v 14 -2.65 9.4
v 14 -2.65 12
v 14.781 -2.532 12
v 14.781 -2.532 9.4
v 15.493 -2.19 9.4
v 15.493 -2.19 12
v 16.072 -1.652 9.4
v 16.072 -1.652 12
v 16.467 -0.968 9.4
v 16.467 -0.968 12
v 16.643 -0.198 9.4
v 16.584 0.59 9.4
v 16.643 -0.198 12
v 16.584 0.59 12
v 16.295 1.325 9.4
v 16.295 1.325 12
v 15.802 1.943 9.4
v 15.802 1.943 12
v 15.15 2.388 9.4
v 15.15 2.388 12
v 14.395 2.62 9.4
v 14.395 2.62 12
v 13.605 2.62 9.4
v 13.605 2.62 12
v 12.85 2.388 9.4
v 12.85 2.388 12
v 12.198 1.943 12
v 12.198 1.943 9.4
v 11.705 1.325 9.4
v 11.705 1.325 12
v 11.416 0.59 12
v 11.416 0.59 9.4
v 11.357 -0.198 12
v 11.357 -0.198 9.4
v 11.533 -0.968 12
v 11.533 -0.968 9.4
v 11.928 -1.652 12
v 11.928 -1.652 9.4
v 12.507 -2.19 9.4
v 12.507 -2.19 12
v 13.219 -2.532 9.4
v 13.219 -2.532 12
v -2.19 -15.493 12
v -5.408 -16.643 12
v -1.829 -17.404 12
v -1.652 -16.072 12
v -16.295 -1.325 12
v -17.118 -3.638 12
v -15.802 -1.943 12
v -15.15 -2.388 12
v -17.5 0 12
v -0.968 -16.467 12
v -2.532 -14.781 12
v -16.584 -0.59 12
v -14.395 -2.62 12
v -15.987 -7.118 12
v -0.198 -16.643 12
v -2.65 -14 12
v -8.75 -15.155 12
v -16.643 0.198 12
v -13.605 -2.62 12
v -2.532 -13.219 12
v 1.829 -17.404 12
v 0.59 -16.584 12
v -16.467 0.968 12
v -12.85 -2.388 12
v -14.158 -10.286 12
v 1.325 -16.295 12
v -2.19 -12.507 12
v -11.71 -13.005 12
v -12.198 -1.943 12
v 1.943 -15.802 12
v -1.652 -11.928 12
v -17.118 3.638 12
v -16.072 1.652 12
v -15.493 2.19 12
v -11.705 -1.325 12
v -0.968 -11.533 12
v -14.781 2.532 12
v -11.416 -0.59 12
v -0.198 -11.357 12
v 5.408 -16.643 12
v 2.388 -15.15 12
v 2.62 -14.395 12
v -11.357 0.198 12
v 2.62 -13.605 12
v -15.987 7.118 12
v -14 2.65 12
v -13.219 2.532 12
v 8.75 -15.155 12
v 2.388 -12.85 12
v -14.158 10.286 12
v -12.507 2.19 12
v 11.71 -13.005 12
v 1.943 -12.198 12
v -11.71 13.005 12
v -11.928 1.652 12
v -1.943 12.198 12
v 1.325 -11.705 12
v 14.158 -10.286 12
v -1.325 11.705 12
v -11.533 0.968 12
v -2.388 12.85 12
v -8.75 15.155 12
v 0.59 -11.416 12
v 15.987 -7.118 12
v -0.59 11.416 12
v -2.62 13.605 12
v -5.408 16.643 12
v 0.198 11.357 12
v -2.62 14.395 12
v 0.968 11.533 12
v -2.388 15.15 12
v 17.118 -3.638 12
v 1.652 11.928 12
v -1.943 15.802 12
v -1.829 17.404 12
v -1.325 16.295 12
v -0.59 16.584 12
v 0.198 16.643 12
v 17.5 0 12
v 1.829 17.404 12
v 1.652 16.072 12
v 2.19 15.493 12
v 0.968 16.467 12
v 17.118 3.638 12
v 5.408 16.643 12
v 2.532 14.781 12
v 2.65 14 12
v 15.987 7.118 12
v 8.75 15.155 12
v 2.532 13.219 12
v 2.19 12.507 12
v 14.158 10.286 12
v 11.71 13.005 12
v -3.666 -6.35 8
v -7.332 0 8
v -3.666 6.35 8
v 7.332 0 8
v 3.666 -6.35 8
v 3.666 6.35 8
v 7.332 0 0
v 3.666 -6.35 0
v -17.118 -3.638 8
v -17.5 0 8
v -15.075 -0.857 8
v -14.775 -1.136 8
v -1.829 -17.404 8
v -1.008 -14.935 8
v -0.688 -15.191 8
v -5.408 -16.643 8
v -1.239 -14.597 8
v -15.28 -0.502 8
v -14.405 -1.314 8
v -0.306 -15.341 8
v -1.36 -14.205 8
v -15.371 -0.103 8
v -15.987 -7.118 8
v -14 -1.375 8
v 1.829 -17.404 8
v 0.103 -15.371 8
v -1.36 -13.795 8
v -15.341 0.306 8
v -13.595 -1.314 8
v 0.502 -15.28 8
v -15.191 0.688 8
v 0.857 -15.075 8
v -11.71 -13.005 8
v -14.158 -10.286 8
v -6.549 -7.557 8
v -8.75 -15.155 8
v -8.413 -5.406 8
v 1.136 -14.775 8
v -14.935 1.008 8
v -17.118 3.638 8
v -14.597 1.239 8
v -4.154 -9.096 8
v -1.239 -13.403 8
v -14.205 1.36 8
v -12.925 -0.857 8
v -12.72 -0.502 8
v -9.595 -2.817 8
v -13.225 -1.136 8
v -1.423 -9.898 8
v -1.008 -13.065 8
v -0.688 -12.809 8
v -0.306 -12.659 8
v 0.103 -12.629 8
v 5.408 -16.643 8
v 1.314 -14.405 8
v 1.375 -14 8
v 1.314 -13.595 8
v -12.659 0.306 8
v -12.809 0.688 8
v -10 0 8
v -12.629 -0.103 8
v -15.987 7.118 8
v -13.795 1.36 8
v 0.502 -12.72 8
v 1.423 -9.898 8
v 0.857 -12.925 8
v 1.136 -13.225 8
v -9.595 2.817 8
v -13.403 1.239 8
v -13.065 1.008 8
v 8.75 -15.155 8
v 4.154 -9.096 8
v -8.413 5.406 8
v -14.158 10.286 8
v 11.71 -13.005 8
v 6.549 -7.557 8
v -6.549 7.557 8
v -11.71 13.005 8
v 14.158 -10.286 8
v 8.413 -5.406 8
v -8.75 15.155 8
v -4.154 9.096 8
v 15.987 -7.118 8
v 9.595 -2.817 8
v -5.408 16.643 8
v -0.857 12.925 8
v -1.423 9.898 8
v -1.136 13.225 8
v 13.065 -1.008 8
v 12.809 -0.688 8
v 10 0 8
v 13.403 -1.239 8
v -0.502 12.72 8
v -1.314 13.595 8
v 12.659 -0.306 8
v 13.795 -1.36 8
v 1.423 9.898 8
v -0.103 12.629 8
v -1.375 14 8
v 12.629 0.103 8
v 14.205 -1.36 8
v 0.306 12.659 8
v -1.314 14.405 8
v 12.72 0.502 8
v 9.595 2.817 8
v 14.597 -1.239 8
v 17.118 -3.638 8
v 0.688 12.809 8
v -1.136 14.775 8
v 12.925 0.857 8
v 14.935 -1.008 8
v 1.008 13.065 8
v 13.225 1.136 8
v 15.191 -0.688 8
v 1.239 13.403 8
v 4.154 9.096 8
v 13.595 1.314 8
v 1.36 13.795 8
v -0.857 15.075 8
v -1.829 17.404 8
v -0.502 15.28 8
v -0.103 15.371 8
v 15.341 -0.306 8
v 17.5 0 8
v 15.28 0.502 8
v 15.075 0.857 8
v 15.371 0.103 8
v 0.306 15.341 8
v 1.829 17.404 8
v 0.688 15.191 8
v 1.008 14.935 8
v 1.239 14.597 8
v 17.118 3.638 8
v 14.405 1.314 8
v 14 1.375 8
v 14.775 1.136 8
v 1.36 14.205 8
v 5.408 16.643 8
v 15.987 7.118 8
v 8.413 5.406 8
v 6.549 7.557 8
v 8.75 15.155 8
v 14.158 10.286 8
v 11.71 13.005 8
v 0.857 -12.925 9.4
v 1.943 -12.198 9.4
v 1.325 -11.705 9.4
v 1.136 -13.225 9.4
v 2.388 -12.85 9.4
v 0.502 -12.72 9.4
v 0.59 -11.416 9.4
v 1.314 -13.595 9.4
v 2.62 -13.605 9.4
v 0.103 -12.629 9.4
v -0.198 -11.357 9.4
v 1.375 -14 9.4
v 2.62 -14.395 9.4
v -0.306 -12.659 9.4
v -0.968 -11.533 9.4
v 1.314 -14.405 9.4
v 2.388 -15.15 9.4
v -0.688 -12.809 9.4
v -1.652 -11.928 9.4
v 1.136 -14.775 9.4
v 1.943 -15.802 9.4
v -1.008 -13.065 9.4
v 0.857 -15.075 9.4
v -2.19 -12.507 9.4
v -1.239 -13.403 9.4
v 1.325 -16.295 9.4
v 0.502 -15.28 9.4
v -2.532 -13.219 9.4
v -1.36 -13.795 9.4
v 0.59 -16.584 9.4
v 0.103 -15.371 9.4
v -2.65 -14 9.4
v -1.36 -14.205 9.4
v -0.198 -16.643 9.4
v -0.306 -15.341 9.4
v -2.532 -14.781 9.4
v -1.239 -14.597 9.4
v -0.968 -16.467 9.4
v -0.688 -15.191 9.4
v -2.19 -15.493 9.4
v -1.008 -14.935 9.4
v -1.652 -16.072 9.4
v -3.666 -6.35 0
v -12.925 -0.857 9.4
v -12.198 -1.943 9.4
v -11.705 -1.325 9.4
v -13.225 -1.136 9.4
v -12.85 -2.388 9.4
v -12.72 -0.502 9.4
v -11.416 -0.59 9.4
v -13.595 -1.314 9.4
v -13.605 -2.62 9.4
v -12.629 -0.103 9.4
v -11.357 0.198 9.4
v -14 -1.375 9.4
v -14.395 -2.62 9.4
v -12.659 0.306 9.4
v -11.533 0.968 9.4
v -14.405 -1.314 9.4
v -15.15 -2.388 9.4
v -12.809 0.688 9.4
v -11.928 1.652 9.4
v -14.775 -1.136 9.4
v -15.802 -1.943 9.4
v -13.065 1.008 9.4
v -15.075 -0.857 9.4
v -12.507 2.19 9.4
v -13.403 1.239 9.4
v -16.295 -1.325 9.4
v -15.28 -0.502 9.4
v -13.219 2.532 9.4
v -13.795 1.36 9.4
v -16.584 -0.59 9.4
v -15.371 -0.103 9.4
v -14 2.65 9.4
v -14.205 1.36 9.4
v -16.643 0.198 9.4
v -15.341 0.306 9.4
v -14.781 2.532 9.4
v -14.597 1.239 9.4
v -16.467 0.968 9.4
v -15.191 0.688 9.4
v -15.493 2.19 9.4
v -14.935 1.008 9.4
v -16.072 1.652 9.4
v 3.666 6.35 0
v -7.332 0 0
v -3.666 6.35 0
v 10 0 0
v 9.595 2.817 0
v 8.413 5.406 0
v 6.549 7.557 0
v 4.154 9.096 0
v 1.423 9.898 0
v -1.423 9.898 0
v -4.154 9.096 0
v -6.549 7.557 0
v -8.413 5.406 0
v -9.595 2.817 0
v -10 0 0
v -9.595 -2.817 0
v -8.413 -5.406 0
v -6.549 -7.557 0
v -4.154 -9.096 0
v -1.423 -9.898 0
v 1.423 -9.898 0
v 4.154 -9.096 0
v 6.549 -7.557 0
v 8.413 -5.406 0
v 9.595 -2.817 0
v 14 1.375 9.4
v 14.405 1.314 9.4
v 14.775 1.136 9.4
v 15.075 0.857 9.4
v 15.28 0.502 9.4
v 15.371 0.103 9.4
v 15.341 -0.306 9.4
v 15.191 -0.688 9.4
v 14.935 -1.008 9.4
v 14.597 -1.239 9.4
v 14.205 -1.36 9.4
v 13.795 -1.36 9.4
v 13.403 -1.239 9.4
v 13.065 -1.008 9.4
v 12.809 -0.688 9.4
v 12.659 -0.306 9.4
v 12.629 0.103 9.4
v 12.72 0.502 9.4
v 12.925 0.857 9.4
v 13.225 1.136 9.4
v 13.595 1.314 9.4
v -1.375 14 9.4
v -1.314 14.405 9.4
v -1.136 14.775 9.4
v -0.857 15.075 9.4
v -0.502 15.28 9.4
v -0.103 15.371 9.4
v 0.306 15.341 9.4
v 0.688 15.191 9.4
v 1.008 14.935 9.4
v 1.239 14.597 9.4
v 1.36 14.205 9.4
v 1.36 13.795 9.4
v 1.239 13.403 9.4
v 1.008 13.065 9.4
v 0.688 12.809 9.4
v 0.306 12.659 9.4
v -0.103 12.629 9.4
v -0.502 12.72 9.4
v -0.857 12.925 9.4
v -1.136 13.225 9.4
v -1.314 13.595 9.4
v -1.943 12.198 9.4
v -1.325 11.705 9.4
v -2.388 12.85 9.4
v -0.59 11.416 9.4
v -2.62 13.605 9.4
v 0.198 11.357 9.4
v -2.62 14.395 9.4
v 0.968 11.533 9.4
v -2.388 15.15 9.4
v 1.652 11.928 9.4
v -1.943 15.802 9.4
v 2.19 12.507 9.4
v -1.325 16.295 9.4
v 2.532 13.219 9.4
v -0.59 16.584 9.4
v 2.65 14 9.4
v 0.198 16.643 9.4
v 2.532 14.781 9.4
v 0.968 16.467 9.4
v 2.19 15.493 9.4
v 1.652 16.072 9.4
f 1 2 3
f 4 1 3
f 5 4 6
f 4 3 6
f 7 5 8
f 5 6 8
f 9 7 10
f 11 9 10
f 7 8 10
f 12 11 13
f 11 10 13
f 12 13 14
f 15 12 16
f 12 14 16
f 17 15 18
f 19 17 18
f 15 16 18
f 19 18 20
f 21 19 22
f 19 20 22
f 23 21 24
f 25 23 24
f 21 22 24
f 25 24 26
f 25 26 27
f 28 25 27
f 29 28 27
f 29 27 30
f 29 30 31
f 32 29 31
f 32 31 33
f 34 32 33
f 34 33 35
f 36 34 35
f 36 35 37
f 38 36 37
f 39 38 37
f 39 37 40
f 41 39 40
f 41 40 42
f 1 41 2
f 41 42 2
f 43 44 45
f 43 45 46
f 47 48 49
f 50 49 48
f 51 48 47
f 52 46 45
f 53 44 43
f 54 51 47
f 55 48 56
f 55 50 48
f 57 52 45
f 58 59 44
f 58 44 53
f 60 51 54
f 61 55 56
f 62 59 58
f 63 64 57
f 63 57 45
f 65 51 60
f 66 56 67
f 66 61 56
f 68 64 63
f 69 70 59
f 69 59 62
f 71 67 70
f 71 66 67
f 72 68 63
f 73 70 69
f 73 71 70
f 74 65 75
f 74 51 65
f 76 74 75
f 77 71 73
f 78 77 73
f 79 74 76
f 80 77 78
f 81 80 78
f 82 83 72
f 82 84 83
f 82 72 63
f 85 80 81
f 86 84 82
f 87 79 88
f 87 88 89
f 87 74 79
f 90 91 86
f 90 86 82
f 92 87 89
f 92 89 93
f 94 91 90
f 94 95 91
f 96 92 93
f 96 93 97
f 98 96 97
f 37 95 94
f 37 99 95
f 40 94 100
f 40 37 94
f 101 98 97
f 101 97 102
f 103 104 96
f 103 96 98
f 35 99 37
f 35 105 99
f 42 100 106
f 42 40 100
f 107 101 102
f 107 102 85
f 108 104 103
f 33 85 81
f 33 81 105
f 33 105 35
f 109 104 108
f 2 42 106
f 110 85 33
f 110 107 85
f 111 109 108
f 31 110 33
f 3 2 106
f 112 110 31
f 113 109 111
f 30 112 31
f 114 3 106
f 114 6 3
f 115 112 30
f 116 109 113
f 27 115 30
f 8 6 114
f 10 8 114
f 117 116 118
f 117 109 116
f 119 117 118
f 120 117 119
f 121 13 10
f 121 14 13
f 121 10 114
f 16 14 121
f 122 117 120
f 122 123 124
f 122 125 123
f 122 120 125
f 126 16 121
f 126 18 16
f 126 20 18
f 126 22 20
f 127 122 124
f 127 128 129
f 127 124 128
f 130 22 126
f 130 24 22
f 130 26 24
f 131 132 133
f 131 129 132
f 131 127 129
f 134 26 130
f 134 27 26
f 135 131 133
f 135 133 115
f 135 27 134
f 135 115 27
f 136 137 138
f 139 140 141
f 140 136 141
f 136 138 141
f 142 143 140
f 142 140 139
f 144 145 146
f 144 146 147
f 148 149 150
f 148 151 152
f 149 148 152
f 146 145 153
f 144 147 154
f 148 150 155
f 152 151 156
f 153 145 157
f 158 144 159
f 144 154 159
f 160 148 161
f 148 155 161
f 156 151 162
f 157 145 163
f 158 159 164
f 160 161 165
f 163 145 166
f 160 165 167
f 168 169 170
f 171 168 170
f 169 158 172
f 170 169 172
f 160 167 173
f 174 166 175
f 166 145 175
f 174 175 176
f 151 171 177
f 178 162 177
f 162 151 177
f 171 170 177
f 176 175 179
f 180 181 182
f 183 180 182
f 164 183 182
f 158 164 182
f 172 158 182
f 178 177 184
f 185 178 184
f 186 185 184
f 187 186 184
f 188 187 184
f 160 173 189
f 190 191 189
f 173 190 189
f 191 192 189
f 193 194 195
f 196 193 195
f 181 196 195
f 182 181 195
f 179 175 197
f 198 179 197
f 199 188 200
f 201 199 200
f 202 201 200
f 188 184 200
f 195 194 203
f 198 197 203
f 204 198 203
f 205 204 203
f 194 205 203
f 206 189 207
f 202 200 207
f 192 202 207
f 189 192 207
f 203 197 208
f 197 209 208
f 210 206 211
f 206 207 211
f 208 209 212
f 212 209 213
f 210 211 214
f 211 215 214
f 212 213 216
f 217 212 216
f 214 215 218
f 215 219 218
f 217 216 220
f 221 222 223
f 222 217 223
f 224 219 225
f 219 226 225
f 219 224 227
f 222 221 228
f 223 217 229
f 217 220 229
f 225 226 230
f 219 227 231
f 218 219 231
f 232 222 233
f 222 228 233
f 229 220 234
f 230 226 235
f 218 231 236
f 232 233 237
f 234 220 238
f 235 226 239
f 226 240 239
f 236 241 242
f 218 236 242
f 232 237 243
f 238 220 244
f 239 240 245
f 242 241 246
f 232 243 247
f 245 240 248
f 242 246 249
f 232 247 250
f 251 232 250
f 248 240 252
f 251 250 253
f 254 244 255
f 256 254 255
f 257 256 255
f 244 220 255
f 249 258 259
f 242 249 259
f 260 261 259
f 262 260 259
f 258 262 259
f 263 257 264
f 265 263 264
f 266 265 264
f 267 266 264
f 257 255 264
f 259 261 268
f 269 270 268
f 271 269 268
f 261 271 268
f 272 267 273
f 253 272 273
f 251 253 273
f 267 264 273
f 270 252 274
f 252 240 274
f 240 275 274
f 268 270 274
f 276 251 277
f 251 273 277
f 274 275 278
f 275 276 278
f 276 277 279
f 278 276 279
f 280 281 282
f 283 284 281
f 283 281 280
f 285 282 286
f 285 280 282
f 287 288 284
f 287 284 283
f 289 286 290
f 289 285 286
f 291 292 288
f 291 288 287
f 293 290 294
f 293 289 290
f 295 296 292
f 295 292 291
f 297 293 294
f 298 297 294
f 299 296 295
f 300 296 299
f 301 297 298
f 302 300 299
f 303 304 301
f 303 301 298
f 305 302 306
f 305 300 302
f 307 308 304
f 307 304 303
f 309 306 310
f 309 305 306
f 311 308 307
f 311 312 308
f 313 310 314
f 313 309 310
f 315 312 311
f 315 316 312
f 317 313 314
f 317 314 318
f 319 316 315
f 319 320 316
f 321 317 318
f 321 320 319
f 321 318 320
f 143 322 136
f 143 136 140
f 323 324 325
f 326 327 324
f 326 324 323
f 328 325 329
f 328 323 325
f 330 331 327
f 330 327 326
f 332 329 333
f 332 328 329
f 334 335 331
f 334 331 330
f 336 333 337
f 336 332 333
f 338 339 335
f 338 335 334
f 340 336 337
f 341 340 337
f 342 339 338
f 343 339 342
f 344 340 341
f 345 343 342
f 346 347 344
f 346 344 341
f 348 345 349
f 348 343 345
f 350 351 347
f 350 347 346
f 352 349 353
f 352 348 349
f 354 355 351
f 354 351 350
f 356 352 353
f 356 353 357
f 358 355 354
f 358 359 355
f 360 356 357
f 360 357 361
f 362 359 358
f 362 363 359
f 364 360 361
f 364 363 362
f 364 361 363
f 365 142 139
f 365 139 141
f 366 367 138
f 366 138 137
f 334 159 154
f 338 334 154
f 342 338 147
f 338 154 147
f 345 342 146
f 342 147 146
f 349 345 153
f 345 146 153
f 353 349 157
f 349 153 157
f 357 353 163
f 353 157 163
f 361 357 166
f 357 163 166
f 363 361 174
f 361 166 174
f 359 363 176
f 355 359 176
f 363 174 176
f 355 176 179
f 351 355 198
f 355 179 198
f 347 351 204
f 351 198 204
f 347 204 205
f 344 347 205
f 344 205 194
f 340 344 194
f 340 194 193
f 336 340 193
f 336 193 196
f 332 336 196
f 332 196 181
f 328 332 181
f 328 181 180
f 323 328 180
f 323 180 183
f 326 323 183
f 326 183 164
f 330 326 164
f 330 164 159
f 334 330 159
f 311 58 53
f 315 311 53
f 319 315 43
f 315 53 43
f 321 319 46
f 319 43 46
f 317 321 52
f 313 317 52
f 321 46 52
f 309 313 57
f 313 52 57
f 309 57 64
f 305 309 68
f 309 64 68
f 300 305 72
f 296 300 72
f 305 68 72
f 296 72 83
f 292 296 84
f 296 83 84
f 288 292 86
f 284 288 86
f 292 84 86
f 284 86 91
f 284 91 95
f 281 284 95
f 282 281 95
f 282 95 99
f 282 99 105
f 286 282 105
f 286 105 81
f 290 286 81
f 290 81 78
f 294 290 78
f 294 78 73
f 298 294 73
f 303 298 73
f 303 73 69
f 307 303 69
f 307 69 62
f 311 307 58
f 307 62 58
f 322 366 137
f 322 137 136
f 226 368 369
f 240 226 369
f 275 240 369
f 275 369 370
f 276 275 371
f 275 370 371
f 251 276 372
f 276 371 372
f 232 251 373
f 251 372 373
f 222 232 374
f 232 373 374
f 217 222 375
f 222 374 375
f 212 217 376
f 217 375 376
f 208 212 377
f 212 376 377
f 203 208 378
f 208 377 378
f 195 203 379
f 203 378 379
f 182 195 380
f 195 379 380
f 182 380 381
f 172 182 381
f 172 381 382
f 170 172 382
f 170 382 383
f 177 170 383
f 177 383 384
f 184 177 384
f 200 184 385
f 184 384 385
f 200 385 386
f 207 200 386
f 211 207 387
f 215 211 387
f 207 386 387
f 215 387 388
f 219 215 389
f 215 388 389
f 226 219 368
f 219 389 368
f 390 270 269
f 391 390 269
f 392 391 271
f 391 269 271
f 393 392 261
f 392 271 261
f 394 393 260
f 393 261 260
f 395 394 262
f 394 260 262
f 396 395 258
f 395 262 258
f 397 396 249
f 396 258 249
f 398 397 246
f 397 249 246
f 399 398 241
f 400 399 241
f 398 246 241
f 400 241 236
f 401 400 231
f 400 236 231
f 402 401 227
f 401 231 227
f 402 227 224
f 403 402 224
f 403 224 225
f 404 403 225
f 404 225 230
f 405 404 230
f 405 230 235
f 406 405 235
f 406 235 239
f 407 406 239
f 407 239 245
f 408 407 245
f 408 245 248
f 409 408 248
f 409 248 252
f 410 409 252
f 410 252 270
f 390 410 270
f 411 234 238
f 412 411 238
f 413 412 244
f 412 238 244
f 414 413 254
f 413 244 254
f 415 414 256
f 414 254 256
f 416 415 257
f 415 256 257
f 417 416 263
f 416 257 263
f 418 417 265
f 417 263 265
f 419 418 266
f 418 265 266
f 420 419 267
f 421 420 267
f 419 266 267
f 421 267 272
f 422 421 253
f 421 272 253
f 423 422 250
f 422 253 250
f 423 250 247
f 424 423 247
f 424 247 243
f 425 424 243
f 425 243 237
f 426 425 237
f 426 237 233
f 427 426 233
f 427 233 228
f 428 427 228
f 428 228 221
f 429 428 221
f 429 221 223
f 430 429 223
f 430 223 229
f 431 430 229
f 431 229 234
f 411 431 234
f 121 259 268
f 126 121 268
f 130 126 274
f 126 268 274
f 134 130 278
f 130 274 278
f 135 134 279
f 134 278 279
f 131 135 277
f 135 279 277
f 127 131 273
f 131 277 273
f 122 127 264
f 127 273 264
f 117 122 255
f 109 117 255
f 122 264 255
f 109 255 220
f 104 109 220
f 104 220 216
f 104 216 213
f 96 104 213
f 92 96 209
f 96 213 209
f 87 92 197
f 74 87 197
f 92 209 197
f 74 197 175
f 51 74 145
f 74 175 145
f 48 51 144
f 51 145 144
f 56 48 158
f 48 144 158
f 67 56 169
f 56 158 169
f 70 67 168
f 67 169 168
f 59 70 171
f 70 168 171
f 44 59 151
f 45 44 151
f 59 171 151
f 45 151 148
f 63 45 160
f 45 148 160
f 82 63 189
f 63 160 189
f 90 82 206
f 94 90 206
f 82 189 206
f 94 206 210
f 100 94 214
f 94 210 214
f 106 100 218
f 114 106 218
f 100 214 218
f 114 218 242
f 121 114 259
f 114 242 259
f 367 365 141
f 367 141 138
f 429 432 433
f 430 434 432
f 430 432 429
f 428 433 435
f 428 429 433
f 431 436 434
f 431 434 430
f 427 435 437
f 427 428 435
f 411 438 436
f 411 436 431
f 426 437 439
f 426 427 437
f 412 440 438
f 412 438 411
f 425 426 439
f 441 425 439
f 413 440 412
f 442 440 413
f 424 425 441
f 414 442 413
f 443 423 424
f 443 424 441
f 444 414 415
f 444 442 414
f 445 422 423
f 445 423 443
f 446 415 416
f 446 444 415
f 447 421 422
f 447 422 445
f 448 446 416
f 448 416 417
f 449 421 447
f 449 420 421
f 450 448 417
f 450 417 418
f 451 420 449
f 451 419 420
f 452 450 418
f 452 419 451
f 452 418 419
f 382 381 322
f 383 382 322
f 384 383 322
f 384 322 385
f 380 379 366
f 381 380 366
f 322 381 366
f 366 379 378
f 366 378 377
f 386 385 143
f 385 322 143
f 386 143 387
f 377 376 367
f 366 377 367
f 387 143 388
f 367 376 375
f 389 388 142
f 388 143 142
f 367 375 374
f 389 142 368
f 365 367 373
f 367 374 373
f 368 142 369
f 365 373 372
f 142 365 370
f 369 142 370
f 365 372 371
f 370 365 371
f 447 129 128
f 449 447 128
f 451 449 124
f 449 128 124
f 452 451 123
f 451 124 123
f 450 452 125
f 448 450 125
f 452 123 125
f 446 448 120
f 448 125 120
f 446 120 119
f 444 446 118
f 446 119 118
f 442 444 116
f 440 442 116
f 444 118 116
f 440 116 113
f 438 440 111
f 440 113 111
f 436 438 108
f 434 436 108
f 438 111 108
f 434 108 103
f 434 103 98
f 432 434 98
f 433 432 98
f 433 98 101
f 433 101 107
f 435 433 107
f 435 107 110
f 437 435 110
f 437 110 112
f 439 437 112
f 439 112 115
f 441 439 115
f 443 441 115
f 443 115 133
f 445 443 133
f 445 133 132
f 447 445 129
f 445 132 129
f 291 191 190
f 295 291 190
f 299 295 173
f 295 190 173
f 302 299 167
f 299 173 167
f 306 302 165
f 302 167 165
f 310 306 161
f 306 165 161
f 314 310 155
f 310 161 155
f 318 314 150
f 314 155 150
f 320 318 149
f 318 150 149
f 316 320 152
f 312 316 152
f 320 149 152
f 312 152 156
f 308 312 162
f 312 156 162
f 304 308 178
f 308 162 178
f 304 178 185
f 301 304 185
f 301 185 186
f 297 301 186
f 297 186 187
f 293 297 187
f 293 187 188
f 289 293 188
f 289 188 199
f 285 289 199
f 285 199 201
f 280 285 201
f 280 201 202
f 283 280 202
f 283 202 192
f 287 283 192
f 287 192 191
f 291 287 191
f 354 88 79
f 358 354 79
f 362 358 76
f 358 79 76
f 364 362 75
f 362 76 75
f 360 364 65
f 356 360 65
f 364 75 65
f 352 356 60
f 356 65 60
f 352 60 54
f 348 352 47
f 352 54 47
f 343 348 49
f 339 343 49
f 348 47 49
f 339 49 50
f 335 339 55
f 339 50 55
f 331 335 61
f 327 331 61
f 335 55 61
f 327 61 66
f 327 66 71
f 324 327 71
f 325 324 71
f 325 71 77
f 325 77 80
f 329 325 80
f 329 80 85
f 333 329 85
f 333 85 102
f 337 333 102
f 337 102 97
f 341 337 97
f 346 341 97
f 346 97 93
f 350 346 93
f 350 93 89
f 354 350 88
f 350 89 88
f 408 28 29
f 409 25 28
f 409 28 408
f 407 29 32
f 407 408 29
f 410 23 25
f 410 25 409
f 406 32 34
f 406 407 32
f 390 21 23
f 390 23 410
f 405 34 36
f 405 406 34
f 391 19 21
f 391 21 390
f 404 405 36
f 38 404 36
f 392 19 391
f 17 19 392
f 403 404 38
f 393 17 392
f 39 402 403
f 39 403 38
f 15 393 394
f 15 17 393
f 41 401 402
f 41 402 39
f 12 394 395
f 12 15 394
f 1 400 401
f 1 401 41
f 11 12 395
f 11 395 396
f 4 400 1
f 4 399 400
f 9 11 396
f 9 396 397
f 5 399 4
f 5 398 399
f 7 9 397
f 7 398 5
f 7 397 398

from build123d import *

# Parameters (mm, degrees)
SKETCH1_R           = 10
BOSS_EXTRUDE1_DEPTH = 8
SKETCH2_R           = 17.5
BOSS_EXTRUDE2_DEPTH = 4
CUT_EXTRUDE1_REACH  = 28.01
SKETCH3_R           = 1.375
CIRPATTERN1_COUNT   = 4
SKETCH4_R           = 2.65
CUT_EXTRUDE2_DEPTH  = 2.6
CIRPATTERN2_COUNT   = 4


with BuildPart() as part:
    # Sketch1 → Boss-Extrude1 (new body)
    with BuildSketch(Plane.XY):
        Circle(SKETCH1_R)
        Polygon((7.332348419, 0), (3.666174209, 6.35), (-3.666174209, 6.35), (-7.332348419, 0), (-3.666174209, -6.35), (3.666174209, -6.35), align=None, mode=Mode.SUBTRACT)
    extrude(amount=BOSS_EXTRUDE1_DEPTH)

    # Sketch2 → Boss-Extrude2 (add)
    with BuildSketch(Plane.XY.offset(8)):
        Circle(SKETCH2_R)
    extrude(amount=BOSS_EXTRUDE2_DEPTH)

    # Sketch3 → Cut-Extrude1 (cut, up to next)
    with BuildSketch(Plane(origin=(0, 0, 8), x_dir=(-1, 0, 0), z_dir=(0, 0, -1)), mode=Mode.PRIVATE) as cut_extrude1_sk1:
        with Locations((0, 14)):
            Circle(SKETCH3_R)
    cut_extrude1_tool1 = extrude(cut_extrude1_sk1.sketch, amount=-CUT_EXTRUDE1_REACH, mode=Mode.PRIVATE) & part.part
    cut_extrude1 = cut_extrude1_tool1.solids().sort_by_distance((0, 14, 8))[0]
    add(cut_extrude1, mode=Mode.SUBTRACT)

    # CirPattern1: Cut-Extrude1 ×4 about axis
    cirpattern1_axis = Axis((0, 0, 0), (0, 0, 1))
    for i in range(1, CIRPATTERN1_COUNT):
        add(cut_extrude1.rotate(cirpattern1_axis, i * 360 / CIRPATTERN1_COUNT), mode=Mode.SUBTRACT)

    # Sketch4 → Cut-Extrude2 (cut)
    with BuildSketch(Plane.XY.offset(12)):
        with Locations((0, 14)):
            Circle(SKETCH4_R)
    cut_extrude2 = extrude(amount=-CUT_EXTRUDE2_DEPTH, mode=Mode.SUBTRACT)

    # CirPattern2: Cut-Extrude2 ×4 about axis
    cirpattern2_axis = Axis((0, 0, 0), (0, 0, 1))
    for i in range(1, CIRPATTERN2_COUNT):
        add(cut_extrude2.rotate(cirpattern2_axis, i * 360 / CIRPATTERN2_COUNT), mode=Mode.SUBTRACT)


solid = part.part
